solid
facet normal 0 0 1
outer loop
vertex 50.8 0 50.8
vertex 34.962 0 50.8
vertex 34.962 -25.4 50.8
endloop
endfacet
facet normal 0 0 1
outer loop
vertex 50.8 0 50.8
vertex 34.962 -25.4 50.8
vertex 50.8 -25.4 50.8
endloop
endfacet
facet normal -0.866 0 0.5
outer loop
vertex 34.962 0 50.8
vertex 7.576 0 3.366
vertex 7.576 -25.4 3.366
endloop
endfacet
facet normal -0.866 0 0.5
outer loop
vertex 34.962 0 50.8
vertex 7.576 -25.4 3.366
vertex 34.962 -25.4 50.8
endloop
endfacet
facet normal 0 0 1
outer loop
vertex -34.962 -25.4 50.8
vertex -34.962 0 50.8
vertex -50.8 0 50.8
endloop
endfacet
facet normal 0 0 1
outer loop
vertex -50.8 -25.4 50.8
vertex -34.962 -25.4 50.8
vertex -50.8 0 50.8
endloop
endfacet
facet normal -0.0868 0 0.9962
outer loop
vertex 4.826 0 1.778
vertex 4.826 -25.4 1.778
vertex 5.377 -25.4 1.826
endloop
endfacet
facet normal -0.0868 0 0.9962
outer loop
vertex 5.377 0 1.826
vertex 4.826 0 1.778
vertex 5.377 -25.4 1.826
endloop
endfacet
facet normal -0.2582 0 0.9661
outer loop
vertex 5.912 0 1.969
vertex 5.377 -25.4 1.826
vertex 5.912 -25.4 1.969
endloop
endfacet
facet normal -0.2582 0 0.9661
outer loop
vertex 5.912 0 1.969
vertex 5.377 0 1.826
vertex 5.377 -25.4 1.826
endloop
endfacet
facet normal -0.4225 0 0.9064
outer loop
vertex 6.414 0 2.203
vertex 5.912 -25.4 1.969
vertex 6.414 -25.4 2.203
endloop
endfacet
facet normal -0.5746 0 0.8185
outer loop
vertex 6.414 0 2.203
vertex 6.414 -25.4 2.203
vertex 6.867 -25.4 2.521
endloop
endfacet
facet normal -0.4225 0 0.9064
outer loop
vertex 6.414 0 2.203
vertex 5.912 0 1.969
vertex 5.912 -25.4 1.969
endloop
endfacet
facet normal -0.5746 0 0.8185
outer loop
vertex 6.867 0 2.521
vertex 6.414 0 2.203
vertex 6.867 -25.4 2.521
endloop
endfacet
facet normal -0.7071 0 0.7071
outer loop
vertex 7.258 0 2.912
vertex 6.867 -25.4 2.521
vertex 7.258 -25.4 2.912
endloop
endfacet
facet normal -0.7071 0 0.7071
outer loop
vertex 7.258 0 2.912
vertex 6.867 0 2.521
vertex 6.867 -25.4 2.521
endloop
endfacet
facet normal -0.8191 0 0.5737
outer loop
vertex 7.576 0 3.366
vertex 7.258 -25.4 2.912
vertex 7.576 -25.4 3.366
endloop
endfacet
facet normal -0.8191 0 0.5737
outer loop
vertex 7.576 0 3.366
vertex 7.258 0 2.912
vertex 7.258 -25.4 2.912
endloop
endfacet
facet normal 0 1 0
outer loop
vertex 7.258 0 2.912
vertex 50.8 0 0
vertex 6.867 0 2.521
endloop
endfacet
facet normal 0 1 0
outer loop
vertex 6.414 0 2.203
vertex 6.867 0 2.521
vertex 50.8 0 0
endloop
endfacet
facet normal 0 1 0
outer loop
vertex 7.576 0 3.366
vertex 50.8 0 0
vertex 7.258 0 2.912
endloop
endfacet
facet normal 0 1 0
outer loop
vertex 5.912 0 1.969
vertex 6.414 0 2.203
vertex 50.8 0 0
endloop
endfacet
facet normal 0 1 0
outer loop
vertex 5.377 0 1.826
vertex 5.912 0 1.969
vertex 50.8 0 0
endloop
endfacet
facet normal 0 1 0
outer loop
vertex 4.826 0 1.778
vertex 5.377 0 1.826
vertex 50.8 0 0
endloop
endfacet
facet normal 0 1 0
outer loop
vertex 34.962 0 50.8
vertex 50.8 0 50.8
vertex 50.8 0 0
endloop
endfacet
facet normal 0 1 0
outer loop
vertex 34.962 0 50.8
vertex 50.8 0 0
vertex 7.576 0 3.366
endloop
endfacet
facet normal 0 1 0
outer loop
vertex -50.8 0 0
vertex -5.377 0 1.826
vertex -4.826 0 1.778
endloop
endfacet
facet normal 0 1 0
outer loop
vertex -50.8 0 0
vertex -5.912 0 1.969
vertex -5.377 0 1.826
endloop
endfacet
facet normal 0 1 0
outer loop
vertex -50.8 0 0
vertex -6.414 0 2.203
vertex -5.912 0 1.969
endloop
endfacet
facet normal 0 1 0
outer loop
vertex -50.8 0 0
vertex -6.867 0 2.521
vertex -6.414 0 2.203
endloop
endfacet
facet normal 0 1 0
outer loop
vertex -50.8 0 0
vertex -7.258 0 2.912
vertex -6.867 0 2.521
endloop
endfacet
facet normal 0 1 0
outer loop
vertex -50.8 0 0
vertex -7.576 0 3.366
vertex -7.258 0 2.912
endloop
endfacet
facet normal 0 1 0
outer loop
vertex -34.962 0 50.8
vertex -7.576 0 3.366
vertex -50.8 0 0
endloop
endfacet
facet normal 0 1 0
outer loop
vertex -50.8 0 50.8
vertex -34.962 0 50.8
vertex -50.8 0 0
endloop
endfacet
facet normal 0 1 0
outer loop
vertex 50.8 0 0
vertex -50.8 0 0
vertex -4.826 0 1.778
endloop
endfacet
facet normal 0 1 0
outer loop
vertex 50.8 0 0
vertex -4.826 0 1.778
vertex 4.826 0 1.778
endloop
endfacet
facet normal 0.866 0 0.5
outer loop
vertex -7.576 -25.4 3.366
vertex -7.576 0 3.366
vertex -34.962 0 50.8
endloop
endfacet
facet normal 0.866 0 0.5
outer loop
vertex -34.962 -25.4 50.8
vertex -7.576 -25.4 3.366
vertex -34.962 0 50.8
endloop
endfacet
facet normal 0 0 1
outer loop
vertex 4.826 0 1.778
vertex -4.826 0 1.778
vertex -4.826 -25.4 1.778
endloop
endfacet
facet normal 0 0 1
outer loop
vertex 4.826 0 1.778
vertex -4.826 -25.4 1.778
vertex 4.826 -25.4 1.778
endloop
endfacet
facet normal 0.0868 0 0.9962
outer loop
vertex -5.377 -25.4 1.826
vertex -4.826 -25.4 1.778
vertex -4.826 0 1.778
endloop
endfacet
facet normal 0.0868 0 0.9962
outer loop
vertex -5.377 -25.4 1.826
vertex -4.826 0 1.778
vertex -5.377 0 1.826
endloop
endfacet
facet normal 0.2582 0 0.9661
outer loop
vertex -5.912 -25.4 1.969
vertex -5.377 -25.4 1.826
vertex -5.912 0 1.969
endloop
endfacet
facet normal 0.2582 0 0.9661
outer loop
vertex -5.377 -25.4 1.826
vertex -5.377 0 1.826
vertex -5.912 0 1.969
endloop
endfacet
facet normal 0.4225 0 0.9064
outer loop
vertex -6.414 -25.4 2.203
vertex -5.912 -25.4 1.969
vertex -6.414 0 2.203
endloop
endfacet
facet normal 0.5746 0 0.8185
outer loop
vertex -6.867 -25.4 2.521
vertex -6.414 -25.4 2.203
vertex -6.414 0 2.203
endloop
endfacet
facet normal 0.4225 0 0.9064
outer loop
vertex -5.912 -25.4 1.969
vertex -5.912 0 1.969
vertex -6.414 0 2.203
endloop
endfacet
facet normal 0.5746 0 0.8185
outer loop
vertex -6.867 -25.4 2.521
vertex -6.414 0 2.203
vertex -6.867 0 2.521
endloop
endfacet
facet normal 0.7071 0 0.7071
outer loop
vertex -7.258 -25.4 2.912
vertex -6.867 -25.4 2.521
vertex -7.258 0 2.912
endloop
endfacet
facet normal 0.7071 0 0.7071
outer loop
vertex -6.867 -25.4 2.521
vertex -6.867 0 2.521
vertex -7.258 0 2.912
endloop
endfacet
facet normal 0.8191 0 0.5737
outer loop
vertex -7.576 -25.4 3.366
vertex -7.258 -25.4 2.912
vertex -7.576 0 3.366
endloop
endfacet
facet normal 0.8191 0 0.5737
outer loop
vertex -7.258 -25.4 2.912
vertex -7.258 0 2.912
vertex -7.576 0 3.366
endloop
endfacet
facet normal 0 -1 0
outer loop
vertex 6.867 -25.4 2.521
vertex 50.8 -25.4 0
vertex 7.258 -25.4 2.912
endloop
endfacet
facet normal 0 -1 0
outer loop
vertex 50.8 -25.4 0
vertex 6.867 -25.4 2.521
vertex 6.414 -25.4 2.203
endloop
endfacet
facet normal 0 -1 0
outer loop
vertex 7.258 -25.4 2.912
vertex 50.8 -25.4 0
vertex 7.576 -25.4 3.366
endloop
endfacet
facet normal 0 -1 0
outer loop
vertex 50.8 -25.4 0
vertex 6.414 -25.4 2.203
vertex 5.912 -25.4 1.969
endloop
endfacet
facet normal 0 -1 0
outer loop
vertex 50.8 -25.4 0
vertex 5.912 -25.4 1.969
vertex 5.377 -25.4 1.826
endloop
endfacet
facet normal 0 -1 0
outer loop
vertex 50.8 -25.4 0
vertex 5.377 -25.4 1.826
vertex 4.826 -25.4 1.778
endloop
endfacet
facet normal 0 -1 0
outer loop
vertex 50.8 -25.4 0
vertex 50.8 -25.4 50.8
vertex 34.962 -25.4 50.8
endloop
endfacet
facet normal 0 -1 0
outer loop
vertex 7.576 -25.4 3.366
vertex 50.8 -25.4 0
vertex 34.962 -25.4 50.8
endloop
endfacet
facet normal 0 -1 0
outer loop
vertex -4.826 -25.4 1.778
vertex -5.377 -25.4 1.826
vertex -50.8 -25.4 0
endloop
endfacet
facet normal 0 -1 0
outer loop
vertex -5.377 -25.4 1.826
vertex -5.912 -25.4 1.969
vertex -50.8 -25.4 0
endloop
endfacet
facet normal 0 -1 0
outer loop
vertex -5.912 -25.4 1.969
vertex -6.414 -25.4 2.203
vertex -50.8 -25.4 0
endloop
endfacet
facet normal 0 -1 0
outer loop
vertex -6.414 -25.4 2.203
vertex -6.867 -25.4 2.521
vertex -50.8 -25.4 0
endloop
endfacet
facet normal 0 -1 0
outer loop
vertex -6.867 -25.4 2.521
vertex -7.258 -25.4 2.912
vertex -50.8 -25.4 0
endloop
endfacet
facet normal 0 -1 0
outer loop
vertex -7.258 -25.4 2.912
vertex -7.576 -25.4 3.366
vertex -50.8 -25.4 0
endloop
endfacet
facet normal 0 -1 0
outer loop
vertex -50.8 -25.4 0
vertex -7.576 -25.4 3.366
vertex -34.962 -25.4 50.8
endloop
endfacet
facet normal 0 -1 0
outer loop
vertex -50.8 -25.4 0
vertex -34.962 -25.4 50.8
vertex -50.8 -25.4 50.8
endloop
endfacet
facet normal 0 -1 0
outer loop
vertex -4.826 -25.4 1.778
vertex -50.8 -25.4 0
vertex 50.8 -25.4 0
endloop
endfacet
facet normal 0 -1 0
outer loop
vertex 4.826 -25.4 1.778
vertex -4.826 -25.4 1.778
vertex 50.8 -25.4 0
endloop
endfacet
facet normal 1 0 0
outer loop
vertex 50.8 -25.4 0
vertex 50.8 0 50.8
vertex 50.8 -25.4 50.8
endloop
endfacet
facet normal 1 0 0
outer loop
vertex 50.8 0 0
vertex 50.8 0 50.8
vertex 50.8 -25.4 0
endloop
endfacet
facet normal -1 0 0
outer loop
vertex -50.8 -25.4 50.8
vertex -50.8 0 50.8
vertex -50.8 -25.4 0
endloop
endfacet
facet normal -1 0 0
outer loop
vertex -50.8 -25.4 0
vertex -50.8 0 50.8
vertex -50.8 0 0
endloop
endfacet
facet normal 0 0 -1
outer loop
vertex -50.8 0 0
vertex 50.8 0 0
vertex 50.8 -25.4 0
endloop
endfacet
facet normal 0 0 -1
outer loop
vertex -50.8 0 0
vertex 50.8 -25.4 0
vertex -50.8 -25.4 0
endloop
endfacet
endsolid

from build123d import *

# Parameters (mm, degrees)
F1_DEPTH = 25.4


with BuildPart() as f1:
    # F0 (on Front) → F1 (new body)
    with BuildSketch(Plane.XZ):
        with BuildLine():
            Line((-50.8, 0), (0, 0))
            Line((0, 0), (0, 1.778))
            Line((0, 1.778), (-4.826, 1.778))
            ThreePointArc((-4.826, 1.778), (-6.4135, 2.203369), (-7.575631, 3.3655))
            Line((-7.575631, 3.3655), (-34.961952, 50.8))
            Line((-34.961952, 50.8), (-50.8, 50.8))
            Line((-50.8, 50.8), (-50.8, 0))
        make_face()
    extrude(amount=F1_DEPTH)

    # F2: F1 across plane


with BuildPart() as f1_1:
    add(f1.part)
    add(f1.part.mirror(Plane.YZ))


solid = f1_1.part
